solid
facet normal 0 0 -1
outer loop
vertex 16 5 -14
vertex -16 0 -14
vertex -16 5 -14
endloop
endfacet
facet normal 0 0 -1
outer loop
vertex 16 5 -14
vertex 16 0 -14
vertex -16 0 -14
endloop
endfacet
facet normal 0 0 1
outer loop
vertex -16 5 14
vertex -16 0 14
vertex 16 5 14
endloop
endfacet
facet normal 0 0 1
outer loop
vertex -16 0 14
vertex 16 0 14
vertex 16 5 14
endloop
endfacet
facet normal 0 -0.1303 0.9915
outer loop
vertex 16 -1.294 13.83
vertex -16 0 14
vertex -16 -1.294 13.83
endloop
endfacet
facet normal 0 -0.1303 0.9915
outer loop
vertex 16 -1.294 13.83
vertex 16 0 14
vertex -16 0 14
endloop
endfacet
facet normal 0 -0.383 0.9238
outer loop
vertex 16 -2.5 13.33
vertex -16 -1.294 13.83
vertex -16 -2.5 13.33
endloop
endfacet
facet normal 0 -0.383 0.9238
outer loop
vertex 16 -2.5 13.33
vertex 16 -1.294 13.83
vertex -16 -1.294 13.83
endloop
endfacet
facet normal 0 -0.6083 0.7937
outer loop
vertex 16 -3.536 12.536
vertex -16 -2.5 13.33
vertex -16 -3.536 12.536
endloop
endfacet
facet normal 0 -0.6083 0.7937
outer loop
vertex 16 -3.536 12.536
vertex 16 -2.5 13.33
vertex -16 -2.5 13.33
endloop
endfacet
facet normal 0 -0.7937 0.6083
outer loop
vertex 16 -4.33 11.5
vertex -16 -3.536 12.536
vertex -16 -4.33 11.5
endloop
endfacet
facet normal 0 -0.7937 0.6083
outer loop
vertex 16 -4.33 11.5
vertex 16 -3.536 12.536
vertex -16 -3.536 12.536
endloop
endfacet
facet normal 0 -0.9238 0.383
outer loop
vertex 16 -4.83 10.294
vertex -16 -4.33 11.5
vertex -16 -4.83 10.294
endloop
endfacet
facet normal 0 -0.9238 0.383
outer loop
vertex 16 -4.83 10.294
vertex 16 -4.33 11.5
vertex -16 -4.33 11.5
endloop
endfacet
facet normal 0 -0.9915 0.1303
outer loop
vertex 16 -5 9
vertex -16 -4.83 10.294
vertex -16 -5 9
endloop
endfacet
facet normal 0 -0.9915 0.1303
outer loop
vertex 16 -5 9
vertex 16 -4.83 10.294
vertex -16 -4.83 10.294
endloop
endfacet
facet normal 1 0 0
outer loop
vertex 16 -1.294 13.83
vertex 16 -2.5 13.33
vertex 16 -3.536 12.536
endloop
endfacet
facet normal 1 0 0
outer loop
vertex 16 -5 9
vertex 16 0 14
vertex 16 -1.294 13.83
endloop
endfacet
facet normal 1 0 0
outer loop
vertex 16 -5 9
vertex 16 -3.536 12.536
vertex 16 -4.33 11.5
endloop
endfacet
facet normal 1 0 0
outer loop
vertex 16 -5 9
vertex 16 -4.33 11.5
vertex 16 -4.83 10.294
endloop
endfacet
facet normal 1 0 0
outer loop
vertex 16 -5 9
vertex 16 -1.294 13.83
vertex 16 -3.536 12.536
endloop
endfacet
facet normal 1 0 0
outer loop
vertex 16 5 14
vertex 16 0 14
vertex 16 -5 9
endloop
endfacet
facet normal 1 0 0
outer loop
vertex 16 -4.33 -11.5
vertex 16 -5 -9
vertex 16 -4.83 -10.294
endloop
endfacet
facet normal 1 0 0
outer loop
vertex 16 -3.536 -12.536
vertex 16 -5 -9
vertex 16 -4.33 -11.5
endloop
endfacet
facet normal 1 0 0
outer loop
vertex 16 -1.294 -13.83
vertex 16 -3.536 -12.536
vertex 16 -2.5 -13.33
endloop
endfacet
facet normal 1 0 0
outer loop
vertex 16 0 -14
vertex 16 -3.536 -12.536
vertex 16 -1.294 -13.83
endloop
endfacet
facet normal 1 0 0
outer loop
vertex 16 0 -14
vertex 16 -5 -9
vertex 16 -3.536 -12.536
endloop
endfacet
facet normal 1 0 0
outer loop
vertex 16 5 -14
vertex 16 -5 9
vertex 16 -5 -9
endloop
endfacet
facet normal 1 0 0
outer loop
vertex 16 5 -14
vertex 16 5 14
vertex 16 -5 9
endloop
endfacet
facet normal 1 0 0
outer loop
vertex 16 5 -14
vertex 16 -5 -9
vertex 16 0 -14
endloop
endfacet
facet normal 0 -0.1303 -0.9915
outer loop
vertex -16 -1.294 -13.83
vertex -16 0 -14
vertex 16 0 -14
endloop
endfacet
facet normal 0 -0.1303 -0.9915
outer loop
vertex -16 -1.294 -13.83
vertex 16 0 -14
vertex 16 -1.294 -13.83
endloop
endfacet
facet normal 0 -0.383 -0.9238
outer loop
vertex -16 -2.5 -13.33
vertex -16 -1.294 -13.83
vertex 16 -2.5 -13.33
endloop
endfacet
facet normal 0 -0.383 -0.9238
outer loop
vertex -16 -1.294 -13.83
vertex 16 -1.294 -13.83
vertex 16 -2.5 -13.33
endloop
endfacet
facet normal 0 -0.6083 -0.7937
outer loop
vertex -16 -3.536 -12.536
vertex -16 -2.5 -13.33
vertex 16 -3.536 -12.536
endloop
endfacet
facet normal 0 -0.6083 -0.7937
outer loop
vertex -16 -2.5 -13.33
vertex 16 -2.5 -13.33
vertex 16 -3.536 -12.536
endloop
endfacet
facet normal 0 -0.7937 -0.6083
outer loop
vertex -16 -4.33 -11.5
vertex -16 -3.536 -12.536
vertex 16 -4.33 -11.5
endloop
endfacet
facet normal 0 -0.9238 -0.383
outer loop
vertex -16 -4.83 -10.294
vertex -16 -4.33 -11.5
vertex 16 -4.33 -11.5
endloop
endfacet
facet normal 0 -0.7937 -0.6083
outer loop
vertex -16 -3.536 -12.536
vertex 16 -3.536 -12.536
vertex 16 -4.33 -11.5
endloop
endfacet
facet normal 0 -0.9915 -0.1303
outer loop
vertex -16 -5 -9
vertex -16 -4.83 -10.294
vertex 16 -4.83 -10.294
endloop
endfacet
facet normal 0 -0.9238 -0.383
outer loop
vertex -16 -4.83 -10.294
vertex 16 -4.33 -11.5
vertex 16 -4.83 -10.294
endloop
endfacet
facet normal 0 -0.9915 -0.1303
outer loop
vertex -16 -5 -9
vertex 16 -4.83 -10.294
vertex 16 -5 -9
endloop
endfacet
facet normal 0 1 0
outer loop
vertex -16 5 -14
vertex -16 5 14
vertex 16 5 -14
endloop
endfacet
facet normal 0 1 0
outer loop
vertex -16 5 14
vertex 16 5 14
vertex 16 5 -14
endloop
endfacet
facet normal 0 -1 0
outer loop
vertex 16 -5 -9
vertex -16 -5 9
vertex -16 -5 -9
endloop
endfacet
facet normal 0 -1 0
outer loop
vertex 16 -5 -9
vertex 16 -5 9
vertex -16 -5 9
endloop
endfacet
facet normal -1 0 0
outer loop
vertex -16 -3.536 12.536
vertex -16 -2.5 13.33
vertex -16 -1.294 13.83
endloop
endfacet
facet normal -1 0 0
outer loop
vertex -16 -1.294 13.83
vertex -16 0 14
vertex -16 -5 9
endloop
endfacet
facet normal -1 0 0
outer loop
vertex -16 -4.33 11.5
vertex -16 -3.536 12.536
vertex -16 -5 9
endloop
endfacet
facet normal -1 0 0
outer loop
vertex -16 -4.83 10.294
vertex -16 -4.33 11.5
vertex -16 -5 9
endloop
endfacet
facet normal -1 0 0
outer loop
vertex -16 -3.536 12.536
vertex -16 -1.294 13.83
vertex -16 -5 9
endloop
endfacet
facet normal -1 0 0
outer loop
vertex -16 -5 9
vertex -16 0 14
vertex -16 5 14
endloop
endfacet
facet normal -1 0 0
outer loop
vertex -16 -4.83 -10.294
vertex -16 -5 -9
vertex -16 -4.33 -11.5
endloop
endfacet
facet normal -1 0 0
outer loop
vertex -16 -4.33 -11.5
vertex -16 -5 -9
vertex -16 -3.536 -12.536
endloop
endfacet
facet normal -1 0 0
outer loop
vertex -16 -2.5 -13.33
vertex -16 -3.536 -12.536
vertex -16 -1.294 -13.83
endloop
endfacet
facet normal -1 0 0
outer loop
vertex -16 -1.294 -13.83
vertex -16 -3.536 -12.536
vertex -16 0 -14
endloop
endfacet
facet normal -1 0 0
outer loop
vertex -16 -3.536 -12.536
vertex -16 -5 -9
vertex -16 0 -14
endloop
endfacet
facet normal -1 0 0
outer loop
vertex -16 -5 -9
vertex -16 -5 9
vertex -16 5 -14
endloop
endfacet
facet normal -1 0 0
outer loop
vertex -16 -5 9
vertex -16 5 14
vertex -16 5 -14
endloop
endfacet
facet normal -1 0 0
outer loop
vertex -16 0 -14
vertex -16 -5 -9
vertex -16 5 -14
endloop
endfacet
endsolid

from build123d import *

# Parameters (mm, degrees)
SKETCH1_W           = 28
SKETCH1_H           = 10
BOSS_EXTRUDE1_DEPTH = 16
FILLET1_R           = 5


with BuildPart() as part:
    # Sketch1 → Boss-Extrude1 (new, symmetric)
    with BuildSketch(Plane(origin=(0, 0, 0), x_dir=(0, 0, -1), z_dir=(1, 0, 0))):
        Rectangle(SKETCH1_W, SKETCH1_H)
    extrude(amount=BOSS_EXTRUDE1_DEPTH, both=True)

    # Fillet1
    fillet1_edges = [part.edges().sort_by_distance(p)[0] for p in [
        (0, -5, -14),
        (0, -5, 14),
    ]]
    fillet(fillet1_edges, radius=FILLET1_R)


solid = part.part
